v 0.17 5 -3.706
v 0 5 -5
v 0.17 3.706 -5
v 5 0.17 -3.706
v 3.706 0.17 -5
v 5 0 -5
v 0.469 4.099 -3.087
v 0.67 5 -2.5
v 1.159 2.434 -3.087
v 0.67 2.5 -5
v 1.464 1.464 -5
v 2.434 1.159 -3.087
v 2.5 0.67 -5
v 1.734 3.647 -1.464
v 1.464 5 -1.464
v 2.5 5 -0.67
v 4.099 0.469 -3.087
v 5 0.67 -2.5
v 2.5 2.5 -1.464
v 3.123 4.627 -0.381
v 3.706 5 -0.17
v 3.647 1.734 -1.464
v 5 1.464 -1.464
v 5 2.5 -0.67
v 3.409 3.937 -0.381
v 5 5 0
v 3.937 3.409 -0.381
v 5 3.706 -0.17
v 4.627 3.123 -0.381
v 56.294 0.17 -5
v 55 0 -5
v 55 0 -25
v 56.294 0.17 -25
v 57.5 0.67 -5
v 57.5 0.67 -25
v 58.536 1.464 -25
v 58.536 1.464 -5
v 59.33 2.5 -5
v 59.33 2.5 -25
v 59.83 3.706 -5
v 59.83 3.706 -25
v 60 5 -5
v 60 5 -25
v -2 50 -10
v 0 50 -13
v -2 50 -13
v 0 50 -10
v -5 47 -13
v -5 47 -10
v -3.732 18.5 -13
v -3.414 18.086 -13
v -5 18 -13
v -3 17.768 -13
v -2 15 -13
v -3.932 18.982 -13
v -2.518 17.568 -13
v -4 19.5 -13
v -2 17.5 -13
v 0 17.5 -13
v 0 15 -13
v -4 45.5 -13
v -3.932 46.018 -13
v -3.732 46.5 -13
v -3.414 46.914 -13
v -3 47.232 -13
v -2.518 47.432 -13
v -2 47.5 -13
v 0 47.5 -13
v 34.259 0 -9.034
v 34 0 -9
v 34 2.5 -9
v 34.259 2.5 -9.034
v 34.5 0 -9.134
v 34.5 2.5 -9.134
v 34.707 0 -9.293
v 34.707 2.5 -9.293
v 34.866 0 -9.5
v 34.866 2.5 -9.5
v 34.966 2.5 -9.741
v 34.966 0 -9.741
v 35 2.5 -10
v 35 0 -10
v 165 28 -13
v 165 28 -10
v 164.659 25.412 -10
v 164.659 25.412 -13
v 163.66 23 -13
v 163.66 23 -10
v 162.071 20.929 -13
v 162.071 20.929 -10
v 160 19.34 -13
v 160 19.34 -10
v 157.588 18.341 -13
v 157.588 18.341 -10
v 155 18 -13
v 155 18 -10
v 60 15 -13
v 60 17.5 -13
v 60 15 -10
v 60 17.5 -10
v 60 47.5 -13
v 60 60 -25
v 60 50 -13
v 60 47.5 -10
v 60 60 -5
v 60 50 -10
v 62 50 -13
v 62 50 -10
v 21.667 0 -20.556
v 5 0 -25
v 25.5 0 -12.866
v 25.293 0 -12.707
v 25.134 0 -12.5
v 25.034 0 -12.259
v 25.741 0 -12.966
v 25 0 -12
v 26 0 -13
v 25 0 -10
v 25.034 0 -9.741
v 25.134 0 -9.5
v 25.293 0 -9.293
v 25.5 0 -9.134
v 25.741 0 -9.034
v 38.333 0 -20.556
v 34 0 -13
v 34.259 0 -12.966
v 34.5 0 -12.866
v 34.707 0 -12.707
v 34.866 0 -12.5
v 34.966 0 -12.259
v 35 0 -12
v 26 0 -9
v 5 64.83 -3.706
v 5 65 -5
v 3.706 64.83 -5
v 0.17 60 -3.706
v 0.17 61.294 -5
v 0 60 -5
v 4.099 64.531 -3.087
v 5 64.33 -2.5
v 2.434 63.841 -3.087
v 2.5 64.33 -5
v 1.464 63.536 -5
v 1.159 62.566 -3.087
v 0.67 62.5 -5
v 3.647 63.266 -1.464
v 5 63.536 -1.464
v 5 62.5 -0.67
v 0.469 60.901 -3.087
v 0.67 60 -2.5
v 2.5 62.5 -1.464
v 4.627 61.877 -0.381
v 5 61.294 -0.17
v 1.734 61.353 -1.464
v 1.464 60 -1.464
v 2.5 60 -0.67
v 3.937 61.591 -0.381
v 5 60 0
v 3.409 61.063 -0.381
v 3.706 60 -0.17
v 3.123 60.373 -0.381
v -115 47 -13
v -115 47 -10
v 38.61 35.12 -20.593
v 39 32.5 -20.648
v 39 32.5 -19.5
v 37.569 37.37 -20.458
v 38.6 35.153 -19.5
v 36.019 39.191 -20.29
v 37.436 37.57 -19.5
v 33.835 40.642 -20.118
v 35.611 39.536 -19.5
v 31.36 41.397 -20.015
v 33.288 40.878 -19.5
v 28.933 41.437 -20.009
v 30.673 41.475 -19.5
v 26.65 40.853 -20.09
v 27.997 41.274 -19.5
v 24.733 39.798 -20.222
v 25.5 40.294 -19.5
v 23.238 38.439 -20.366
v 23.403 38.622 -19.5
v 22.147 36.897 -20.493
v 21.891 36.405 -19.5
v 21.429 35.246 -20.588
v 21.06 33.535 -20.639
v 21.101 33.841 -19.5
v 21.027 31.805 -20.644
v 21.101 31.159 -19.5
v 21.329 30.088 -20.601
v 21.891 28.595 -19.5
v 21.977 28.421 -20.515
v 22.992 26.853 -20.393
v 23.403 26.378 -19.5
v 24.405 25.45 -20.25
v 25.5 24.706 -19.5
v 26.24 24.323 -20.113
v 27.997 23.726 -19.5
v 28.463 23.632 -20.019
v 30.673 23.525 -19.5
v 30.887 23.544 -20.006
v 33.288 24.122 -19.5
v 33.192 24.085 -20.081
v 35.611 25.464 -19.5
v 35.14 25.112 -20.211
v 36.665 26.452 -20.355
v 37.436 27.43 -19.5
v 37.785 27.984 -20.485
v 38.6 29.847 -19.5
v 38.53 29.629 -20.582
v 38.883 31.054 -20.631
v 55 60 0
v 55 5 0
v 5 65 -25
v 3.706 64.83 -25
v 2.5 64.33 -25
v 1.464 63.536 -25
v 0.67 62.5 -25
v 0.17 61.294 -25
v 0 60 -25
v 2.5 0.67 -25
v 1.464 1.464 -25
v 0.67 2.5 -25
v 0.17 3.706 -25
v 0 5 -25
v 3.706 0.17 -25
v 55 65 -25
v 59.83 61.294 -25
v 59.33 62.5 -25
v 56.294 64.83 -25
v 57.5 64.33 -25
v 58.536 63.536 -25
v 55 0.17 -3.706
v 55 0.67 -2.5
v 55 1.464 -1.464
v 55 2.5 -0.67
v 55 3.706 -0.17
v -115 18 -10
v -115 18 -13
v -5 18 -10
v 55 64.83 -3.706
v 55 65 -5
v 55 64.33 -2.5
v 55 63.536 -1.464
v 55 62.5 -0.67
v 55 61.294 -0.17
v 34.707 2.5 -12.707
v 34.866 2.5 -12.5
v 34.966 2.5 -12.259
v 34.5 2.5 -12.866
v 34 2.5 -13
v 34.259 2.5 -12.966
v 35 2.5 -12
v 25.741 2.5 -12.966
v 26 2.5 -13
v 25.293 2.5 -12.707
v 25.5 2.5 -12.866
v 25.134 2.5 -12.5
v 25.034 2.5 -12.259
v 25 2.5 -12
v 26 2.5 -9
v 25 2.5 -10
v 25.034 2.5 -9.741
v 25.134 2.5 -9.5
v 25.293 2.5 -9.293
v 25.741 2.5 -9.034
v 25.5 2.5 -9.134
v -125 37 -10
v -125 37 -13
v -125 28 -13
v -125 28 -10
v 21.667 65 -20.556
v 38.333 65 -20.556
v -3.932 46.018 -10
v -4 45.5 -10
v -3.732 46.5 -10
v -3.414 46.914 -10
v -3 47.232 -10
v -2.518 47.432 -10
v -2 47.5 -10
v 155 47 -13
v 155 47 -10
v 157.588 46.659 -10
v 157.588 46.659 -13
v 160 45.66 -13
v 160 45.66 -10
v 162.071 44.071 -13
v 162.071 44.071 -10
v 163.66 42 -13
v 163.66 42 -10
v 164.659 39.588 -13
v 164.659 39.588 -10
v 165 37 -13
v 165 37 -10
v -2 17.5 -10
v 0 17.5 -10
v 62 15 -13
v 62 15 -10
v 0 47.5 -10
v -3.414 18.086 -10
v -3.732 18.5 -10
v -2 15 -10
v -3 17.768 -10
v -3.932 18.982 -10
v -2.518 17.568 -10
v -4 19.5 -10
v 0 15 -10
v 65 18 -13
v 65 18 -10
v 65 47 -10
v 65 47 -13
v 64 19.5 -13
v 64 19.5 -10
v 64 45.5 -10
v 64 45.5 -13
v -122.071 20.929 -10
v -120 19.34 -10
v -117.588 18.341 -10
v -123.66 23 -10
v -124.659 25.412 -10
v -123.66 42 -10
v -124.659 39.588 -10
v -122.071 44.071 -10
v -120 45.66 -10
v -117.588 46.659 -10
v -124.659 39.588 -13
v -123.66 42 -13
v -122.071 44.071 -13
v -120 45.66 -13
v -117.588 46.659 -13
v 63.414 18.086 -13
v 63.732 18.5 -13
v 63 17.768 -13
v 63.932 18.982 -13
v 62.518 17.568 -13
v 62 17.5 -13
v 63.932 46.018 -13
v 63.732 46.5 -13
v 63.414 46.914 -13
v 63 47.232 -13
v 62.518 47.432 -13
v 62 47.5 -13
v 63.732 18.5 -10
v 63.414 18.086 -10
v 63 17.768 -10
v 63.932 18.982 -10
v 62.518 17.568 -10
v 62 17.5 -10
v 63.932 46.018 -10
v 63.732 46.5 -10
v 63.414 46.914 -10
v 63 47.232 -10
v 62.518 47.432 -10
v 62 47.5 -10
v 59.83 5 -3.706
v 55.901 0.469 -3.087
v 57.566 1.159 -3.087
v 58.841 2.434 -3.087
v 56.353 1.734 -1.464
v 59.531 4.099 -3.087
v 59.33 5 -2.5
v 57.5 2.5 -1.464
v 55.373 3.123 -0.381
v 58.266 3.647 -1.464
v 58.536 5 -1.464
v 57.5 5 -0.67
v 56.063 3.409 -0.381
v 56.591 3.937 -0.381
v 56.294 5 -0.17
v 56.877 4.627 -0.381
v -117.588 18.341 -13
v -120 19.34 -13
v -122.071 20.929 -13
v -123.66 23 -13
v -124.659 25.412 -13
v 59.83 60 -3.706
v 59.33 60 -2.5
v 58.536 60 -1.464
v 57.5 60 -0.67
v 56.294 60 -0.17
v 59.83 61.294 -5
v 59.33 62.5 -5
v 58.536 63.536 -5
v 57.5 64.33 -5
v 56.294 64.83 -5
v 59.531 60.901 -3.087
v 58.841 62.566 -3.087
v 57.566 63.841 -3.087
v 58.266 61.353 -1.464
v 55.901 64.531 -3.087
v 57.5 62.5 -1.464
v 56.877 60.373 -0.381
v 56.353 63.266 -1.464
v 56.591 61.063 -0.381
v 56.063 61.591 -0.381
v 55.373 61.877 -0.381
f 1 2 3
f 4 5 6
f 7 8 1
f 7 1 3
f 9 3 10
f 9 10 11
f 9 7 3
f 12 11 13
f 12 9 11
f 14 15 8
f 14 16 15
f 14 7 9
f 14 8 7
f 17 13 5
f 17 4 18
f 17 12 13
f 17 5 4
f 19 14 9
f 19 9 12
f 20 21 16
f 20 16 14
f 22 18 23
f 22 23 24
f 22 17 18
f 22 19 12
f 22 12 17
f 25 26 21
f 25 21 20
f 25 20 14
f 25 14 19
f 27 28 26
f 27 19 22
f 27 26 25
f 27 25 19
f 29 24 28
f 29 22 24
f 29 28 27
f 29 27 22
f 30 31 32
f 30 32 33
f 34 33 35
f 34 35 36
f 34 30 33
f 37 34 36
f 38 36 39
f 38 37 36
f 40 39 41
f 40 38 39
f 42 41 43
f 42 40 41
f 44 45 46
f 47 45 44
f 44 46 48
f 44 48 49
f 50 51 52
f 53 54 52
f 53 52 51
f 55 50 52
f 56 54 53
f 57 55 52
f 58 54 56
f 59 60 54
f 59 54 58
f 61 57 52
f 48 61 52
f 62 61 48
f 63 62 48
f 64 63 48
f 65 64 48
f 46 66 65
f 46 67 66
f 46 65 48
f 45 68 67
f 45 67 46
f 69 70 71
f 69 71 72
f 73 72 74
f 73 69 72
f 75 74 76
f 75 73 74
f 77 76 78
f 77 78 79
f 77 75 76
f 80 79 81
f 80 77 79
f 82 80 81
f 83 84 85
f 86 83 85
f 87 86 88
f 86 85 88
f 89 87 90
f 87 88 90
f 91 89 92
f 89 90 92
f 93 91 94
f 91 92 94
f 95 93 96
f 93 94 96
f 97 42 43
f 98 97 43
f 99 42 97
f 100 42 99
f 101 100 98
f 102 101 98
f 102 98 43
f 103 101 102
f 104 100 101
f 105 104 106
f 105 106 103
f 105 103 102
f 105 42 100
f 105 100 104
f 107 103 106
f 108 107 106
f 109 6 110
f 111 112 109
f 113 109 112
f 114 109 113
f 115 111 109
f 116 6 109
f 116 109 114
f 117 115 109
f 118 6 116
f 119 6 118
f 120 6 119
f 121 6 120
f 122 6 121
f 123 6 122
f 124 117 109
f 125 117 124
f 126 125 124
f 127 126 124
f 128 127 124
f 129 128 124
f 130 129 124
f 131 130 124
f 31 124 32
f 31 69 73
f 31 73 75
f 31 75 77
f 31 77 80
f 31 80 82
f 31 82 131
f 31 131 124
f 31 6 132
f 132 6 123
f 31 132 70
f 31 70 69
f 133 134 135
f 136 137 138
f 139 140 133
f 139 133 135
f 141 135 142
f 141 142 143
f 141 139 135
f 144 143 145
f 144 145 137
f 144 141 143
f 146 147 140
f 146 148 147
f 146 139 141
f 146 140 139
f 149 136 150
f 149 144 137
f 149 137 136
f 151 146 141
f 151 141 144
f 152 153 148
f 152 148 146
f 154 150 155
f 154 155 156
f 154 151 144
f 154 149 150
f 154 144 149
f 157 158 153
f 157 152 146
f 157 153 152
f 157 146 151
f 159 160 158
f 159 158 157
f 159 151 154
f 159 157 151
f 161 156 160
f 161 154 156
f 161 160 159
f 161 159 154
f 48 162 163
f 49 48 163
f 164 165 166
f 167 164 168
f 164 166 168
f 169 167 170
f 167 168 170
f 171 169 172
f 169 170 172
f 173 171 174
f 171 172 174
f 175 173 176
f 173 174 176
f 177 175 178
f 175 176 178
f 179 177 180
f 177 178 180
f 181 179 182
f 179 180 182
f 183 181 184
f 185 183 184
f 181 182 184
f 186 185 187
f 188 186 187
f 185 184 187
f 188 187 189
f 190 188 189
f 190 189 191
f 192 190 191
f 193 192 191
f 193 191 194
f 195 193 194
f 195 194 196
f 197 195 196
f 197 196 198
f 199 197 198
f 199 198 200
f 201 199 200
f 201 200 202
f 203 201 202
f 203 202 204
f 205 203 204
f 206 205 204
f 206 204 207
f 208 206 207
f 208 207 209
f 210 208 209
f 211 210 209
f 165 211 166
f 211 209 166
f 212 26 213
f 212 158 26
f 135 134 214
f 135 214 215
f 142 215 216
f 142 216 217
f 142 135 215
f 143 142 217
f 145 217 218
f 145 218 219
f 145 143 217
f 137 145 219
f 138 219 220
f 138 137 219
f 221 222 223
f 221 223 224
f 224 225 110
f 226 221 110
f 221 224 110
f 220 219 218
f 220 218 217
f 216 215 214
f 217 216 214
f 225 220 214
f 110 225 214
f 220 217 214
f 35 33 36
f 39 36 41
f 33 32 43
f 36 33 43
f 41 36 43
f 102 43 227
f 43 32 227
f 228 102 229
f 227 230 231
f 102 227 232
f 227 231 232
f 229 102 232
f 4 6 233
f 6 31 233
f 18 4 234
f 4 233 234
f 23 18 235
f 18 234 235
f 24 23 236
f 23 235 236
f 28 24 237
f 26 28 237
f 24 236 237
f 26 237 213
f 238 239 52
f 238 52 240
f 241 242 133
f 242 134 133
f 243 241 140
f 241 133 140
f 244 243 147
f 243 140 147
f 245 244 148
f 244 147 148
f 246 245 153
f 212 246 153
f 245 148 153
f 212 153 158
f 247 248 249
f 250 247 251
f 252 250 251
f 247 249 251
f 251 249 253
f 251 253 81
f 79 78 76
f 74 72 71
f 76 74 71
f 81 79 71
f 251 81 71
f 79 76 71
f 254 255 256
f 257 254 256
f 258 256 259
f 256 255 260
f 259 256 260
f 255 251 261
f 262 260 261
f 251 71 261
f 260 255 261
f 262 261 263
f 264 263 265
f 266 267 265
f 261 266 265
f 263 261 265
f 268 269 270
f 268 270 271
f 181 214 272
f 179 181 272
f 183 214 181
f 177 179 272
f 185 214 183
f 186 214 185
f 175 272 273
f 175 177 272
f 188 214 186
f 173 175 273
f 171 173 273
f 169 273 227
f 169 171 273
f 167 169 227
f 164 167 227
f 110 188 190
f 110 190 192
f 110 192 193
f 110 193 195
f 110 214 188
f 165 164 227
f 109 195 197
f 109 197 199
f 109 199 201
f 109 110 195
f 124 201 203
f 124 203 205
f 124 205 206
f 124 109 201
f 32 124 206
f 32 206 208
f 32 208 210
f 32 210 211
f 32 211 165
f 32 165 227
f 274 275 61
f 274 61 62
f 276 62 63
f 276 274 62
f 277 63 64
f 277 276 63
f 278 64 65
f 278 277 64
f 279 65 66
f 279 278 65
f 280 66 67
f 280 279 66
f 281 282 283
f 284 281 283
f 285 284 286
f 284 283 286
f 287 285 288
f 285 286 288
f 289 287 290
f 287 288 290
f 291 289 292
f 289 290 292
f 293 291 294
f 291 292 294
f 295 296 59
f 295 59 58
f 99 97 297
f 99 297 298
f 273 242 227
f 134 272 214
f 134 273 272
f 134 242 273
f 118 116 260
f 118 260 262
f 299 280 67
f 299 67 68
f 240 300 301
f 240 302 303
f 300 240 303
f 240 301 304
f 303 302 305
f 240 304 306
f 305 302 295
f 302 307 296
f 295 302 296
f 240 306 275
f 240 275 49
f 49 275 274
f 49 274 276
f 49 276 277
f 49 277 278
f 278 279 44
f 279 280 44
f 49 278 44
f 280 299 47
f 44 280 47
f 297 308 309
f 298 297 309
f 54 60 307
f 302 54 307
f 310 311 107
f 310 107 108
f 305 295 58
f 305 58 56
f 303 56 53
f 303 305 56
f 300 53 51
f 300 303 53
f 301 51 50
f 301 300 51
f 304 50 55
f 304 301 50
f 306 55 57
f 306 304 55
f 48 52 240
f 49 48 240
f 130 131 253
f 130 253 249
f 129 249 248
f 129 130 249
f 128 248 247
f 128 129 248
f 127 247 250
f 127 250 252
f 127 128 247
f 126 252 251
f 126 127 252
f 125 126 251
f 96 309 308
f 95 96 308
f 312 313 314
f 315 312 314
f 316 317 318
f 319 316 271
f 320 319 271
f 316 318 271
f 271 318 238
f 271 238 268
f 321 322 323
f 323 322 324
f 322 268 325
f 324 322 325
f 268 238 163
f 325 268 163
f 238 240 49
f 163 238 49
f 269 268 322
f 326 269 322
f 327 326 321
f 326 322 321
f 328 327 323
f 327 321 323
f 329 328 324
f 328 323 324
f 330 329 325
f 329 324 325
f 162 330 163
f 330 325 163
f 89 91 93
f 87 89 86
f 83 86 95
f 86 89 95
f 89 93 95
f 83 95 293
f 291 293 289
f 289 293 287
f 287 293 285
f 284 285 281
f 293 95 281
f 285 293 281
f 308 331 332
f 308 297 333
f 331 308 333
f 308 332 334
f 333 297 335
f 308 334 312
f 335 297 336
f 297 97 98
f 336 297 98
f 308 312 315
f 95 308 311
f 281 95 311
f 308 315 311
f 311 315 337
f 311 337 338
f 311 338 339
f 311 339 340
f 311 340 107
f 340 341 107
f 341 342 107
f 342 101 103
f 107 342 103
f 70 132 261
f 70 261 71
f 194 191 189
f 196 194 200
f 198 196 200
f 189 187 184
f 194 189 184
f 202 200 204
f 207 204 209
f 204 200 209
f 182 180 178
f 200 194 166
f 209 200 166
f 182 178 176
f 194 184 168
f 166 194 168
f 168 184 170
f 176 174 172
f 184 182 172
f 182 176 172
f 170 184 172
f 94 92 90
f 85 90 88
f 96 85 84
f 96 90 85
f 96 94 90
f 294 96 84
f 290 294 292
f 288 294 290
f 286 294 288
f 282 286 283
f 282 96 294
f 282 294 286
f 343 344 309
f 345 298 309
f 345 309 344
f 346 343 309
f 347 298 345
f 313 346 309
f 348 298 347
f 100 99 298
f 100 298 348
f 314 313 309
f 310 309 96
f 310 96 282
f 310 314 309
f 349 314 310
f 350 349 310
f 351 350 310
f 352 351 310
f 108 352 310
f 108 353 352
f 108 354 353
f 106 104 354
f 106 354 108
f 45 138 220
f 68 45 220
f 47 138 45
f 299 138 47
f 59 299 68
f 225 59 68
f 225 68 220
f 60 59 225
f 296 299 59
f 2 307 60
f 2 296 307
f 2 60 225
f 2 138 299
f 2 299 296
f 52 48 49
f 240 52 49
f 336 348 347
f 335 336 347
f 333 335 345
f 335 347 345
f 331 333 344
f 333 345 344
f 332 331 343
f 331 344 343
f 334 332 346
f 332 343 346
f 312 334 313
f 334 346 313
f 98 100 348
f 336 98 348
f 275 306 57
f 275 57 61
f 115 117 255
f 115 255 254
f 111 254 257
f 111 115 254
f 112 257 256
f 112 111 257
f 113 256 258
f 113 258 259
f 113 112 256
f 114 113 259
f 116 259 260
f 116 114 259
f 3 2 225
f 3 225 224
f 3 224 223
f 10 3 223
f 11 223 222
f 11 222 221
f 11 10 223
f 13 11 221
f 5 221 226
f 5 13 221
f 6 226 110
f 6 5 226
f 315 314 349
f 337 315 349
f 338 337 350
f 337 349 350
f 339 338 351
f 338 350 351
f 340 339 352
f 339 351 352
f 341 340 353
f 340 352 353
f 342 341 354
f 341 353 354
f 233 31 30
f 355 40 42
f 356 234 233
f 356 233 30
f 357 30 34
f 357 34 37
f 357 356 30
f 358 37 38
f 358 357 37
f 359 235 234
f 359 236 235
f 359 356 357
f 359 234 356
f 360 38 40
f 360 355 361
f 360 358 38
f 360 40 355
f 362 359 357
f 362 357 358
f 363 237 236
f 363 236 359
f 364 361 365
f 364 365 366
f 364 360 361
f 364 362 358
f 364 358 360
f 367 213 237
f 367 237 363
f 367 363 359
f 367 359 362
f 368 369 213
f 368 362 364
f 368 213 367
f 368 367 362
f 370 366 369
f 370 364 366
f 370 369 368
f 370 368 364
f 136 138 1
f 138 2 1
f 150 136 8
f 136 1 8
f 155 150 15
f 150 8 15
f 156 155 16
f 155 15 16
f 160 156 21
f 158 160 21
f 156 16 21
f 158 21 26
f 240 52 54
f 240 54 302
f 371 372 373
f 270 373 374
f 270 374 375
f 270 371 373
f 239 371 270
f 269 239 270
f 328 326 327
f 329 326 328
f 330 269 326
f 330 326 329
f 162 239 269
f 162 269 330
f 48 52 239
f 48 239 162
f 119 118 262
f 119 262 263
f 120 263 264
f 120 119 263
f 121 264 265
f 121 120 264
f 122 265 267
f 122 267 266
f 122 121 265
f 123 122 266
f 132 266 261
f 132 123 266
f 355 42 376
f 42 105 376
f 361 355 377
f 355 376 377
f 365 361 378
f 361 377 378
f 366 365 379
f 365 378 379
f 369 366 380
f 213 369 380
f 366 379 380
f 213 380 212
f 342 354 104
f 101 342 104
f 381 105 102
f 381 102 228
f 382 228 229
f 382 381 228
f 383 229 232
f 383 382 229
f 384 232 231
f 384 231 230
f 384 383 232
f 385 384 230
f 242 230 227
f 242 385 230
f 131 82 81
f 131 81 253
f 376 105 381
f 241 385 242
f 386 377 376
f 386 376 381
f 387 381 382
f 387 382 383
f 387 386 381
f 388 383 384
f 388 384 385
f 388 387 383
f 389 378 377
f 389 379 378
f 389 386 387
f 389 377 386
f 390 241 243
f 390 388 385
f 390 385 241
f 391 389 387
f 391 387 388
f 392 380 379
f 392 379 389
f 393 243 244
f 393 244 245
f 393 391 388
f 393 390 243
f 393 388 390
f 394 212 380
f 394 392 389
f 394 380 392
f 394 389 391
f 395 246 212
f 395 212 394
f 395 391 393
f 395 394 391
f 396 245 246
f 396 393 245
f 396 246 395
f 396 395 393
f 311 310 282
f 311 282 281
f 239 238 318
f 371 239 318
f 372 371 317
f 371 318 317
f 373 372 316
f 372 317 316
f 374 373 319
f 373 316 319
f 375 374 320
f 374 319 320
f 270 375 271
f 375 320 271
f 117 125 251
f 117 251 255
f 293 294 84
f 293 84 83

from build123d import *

# Parameters (mm, degrees)
SALIENTE_EXTRUIR1_DEPTH = 25
REDONDEO1_R             = 5
CORTAR_EXTRUIR1_DEPTH   = 65
CROQUIS3_W              = 3
CROQUIS3_H              = 35
SALIENTE_EXTRUIR2_DEPTH = 5
CORTAR_EXTRUIR2_DEPTH   = 3
CHAFL_N2_SIZE           = 3
CHAFL_N3_SIZE           = 3
CROQUIS6_R              = 9
CORTAR_EXTRUIR5_DEPTH   = 1.5
CORTAR_EXTRUIR6_DEPTH   = 2.5
CROQUIS9_W              = 3
CROQUIS9_H              = 29
SALIENTE_EXTRUIR3_DEPTH = 120
CORTAR_EXTRUIR7_DEPTH   = 3
CROQUIS11_W             = 3
CROQUIS11_H             = 29
SALIENTE_EXTRUIR4_DEPTH = 100
CORTAR_EXTRUIR8_DEPTH   = 3


with BuildPart() as part:
    # Croquis1 → Saliente-Extruir1 (new body)
    with BuildSketch(Plane.XY):
        with BuildLine():
            Line((5, 0), (55, 0))
            ThreePointArc((55, 0), (58.535533906, 1.464466094), (60, 5))
            Line((60, 5), (60, 60))
            ThreePointArc((60, 60), (58.535533906, 63.535533906), (55, 65))
            Line((55, 65), (5, 65))
            ThreePointArc((5, 65), (1.464466094, 63.535533906), (0, 60))
            Line((0, 60), (0, 5))
            ThreePointArc((0, 5), (1.464466094, 1.464466094), (5, 0))
        make_face()
    extrude(amount=-SALIENTE_EXTRUIR1_DEPTH)

    # Redondeo1
    redondeo1_edges = [part.edges().sort_by_distance(p)[0] for p in [
        (30, 0, 0),
        (1.464466094, 1.464466094, 0),
        (0, 32.5, 0),
        (1.464466094, 63.535533906, 0),
        (30, 65, 0),
        (58.535533906, 63.535533906, 0),
        (60, 32.5, 0),
        (58.535533906, 1.464466094, 0),
    ]]
    fillet(redondeo1_edges, radius=REDONDEO1_R)

    # Croquis2 → Cortar-Extruir1 (cut)
    with BuildSketch(Plane.XZ):
        with BuildLine():
            Line((5, -25), (55, -25))
            add(Edge.make_bspline(
                [(5, -25), (30, -15), (55, -25)],
                knots=[0, 0, 0, 1, 1, 1], degree=2))
        make_face()
    extrude(amount=-CORTAR_EXTRUIR1_DEPTH, mode=Mode.SUBTRACT)

    # Croquis3 → Saliente-Extruir2 (add)
    with BuildSketch(Plane.ZY):
        with Locations((-11.5, 32.5)):
            Rectangle(CROQUIS3_W, CROQUIS3_H)
    saliente_extruir2 = extrude(amount=SALIENTE_EXTRUIR2_DEPTH)

    # Croquis4 → Cortar-Extruir2 (cut)
    with BuildSketch(Plane.XY.offset(-10)):
        with BuildLine():
            Line((-2, 47.5), (0, 47.5))
            Line((0, 47.5), (0, 17.5))
            Line((0, 17.5), (-2, 17.5))
            ThreePointArc((-2, 17.5), (-3.414213562, 18.085786438), (-4, 19.5))
            Line((-4, 19.5), (-4, 45.5))
            ThreePointArc((-4, 45.5), (-3.414213562, 46.914213562), (-2, 47.5))
        make_face()
    cortar_extruir2 = extrude(amount=-CORTAR_EXTRUIR2_DEPTH, mode=Mode.SUBTRACT)

    # Chaflán2
    chafl_n2_edges = [part.edges().sort_by_distance(p)[0] for p in [
        (-5, 15, -11.5),
        (-5, 50, -11.5),
    ]]
    chamfer(chafl_n2_edges, length=CHAFL_N2_SIZE)

    # Simetría1: Saliente-Extruir2 across plane
    add(saliente_extruir2.mirror(Plane(origin=(30, 0, 0), x_dir=(0, 0, 1), z_dir=(1, 0, 0))))

    # Simetría2: Cortar-Extruir2 across plane
    add(cortar_extruir2.mirror(Plane(origin=(30, 0, 0), x_dir=(0, 0, 1), z_dir=(1, 0, 0))), mode=Mode.SUBTRACT)

    # Chaflán3
    chafl_n3_edges = [part.edges().sort_by_distance(p)[0] for p in [
        (65, 15, -11.5),
        (65, 50, -11.5),
    ]]
    chamfer(chafl_n3_edges, length=CHAFL_N3_SIZE)

    # Croquis6 → Cortar-Extruir5 (cut)
    with BuildSketch(Plane.XY.offset(-19.5)):
        with Locations((30, 32.5)):
            Circle(CROQUIS6_R)
    extrude(amount=-CORTAR_EXTRUIR5_DEPTH, mode=Mode.SUBTRACT)

    # Croquis7 → Cortar-Extruir6 (cut)
    with BuildSketch(Plane.XZ):
        with BuildLine():
            Line((26, -9), (34, -9))
            ThreePointArc((34, -9), (34.707106781, -9.292893219), (35, -10))
            Line((35, -10), (35, -12))
            ThreePointArc((35, -12), (34.707106781, -12.707106781), (34, -13))
            Line((34, -13), (26, -13))
            ThreePointArc((26, -13), (25.292893219, -12.707106781), (25, -12))
            Line((25, -12), (25, -10))
            ThreePointArc((25, -10), (25.292893219, -9.292893219), (26, -9))
        make_face()
    extrude(amount=-CORTAR_EXTRUIR6_DEPTH, mode=Mode.SUBTRACT)

    # Croquis11 → Saliente-Extruir4 (add)
    with BuildSketch(Plane(origin=(65, 0, 0), x_dir=(0, 0, -1), z_dir=(1, 0, 0))):
        with Locations((11.5, 32.5)):
            Rectangle(CROQUIS11_W, CROQUIS11_H)
    extrude(amount=SALIENTE_EXTRUIR4_DEPTH)

    # Croquis12 → Cortar-Extruir8 (cut)
    with BuildSketch(Plane.XY.offset(-10)):
        with BuildLine():
            ThreePointArc((165, 28), (162.071067812, 20.928932188), (155, 18))
            Line((155, 18), (165, 18))
            Line((165, 18), (165, 28))
        make_face()
        with BuildLine():
            Line((165, 47), (155, 47))
            ThreePointArc((155, 47), (162.071067812, 44.071067812), (165, 37))
            Line((165, 37), (165, 47))
        make_face()
    extrude(amount=-CORTAR_EXTRUIR8_DEPTH, mode=Mode.SUBTRACT)


with BuildPart() as body_2:
    # Croquis9 → Saliente-Extruir3 (new body)
    with BuildSketch(Plane.ZY.offset(5)):
        with Locations((-11.5, 32.5)):
            Rectangle(CROQUIS9_W, CROQUIS9_H)
    extrude(amount=SALIENTE_EXTRUIR3_DEPTH)

    # Croquis10 → Cortar-Extruir7 (cut)
    with BuildSketch(Plane.XY.offset(-10)):
        with BuildLine():
            ThreePointArc((-125, 37), (-122.071067812, 44.071067812), (-115, 47))
            Line((-115, 47), (-125, 47))
            Line((-125, 47), (-125, 37))
        make_face()
        with BuildLine():
            Line((-125, 18), (-115, 18))
            ThreePointArc((-115, 18), (-122.071067812, 20.928932188), (-125, 28))
            Line((-125, 28), (-125, 18))
        make_face()
    extrude(amount=-CORTAR_EXTRUIR7_DEPTH, mode=Mode.SUBTRACT)


solid = Compound([part.part, body_2.part])
